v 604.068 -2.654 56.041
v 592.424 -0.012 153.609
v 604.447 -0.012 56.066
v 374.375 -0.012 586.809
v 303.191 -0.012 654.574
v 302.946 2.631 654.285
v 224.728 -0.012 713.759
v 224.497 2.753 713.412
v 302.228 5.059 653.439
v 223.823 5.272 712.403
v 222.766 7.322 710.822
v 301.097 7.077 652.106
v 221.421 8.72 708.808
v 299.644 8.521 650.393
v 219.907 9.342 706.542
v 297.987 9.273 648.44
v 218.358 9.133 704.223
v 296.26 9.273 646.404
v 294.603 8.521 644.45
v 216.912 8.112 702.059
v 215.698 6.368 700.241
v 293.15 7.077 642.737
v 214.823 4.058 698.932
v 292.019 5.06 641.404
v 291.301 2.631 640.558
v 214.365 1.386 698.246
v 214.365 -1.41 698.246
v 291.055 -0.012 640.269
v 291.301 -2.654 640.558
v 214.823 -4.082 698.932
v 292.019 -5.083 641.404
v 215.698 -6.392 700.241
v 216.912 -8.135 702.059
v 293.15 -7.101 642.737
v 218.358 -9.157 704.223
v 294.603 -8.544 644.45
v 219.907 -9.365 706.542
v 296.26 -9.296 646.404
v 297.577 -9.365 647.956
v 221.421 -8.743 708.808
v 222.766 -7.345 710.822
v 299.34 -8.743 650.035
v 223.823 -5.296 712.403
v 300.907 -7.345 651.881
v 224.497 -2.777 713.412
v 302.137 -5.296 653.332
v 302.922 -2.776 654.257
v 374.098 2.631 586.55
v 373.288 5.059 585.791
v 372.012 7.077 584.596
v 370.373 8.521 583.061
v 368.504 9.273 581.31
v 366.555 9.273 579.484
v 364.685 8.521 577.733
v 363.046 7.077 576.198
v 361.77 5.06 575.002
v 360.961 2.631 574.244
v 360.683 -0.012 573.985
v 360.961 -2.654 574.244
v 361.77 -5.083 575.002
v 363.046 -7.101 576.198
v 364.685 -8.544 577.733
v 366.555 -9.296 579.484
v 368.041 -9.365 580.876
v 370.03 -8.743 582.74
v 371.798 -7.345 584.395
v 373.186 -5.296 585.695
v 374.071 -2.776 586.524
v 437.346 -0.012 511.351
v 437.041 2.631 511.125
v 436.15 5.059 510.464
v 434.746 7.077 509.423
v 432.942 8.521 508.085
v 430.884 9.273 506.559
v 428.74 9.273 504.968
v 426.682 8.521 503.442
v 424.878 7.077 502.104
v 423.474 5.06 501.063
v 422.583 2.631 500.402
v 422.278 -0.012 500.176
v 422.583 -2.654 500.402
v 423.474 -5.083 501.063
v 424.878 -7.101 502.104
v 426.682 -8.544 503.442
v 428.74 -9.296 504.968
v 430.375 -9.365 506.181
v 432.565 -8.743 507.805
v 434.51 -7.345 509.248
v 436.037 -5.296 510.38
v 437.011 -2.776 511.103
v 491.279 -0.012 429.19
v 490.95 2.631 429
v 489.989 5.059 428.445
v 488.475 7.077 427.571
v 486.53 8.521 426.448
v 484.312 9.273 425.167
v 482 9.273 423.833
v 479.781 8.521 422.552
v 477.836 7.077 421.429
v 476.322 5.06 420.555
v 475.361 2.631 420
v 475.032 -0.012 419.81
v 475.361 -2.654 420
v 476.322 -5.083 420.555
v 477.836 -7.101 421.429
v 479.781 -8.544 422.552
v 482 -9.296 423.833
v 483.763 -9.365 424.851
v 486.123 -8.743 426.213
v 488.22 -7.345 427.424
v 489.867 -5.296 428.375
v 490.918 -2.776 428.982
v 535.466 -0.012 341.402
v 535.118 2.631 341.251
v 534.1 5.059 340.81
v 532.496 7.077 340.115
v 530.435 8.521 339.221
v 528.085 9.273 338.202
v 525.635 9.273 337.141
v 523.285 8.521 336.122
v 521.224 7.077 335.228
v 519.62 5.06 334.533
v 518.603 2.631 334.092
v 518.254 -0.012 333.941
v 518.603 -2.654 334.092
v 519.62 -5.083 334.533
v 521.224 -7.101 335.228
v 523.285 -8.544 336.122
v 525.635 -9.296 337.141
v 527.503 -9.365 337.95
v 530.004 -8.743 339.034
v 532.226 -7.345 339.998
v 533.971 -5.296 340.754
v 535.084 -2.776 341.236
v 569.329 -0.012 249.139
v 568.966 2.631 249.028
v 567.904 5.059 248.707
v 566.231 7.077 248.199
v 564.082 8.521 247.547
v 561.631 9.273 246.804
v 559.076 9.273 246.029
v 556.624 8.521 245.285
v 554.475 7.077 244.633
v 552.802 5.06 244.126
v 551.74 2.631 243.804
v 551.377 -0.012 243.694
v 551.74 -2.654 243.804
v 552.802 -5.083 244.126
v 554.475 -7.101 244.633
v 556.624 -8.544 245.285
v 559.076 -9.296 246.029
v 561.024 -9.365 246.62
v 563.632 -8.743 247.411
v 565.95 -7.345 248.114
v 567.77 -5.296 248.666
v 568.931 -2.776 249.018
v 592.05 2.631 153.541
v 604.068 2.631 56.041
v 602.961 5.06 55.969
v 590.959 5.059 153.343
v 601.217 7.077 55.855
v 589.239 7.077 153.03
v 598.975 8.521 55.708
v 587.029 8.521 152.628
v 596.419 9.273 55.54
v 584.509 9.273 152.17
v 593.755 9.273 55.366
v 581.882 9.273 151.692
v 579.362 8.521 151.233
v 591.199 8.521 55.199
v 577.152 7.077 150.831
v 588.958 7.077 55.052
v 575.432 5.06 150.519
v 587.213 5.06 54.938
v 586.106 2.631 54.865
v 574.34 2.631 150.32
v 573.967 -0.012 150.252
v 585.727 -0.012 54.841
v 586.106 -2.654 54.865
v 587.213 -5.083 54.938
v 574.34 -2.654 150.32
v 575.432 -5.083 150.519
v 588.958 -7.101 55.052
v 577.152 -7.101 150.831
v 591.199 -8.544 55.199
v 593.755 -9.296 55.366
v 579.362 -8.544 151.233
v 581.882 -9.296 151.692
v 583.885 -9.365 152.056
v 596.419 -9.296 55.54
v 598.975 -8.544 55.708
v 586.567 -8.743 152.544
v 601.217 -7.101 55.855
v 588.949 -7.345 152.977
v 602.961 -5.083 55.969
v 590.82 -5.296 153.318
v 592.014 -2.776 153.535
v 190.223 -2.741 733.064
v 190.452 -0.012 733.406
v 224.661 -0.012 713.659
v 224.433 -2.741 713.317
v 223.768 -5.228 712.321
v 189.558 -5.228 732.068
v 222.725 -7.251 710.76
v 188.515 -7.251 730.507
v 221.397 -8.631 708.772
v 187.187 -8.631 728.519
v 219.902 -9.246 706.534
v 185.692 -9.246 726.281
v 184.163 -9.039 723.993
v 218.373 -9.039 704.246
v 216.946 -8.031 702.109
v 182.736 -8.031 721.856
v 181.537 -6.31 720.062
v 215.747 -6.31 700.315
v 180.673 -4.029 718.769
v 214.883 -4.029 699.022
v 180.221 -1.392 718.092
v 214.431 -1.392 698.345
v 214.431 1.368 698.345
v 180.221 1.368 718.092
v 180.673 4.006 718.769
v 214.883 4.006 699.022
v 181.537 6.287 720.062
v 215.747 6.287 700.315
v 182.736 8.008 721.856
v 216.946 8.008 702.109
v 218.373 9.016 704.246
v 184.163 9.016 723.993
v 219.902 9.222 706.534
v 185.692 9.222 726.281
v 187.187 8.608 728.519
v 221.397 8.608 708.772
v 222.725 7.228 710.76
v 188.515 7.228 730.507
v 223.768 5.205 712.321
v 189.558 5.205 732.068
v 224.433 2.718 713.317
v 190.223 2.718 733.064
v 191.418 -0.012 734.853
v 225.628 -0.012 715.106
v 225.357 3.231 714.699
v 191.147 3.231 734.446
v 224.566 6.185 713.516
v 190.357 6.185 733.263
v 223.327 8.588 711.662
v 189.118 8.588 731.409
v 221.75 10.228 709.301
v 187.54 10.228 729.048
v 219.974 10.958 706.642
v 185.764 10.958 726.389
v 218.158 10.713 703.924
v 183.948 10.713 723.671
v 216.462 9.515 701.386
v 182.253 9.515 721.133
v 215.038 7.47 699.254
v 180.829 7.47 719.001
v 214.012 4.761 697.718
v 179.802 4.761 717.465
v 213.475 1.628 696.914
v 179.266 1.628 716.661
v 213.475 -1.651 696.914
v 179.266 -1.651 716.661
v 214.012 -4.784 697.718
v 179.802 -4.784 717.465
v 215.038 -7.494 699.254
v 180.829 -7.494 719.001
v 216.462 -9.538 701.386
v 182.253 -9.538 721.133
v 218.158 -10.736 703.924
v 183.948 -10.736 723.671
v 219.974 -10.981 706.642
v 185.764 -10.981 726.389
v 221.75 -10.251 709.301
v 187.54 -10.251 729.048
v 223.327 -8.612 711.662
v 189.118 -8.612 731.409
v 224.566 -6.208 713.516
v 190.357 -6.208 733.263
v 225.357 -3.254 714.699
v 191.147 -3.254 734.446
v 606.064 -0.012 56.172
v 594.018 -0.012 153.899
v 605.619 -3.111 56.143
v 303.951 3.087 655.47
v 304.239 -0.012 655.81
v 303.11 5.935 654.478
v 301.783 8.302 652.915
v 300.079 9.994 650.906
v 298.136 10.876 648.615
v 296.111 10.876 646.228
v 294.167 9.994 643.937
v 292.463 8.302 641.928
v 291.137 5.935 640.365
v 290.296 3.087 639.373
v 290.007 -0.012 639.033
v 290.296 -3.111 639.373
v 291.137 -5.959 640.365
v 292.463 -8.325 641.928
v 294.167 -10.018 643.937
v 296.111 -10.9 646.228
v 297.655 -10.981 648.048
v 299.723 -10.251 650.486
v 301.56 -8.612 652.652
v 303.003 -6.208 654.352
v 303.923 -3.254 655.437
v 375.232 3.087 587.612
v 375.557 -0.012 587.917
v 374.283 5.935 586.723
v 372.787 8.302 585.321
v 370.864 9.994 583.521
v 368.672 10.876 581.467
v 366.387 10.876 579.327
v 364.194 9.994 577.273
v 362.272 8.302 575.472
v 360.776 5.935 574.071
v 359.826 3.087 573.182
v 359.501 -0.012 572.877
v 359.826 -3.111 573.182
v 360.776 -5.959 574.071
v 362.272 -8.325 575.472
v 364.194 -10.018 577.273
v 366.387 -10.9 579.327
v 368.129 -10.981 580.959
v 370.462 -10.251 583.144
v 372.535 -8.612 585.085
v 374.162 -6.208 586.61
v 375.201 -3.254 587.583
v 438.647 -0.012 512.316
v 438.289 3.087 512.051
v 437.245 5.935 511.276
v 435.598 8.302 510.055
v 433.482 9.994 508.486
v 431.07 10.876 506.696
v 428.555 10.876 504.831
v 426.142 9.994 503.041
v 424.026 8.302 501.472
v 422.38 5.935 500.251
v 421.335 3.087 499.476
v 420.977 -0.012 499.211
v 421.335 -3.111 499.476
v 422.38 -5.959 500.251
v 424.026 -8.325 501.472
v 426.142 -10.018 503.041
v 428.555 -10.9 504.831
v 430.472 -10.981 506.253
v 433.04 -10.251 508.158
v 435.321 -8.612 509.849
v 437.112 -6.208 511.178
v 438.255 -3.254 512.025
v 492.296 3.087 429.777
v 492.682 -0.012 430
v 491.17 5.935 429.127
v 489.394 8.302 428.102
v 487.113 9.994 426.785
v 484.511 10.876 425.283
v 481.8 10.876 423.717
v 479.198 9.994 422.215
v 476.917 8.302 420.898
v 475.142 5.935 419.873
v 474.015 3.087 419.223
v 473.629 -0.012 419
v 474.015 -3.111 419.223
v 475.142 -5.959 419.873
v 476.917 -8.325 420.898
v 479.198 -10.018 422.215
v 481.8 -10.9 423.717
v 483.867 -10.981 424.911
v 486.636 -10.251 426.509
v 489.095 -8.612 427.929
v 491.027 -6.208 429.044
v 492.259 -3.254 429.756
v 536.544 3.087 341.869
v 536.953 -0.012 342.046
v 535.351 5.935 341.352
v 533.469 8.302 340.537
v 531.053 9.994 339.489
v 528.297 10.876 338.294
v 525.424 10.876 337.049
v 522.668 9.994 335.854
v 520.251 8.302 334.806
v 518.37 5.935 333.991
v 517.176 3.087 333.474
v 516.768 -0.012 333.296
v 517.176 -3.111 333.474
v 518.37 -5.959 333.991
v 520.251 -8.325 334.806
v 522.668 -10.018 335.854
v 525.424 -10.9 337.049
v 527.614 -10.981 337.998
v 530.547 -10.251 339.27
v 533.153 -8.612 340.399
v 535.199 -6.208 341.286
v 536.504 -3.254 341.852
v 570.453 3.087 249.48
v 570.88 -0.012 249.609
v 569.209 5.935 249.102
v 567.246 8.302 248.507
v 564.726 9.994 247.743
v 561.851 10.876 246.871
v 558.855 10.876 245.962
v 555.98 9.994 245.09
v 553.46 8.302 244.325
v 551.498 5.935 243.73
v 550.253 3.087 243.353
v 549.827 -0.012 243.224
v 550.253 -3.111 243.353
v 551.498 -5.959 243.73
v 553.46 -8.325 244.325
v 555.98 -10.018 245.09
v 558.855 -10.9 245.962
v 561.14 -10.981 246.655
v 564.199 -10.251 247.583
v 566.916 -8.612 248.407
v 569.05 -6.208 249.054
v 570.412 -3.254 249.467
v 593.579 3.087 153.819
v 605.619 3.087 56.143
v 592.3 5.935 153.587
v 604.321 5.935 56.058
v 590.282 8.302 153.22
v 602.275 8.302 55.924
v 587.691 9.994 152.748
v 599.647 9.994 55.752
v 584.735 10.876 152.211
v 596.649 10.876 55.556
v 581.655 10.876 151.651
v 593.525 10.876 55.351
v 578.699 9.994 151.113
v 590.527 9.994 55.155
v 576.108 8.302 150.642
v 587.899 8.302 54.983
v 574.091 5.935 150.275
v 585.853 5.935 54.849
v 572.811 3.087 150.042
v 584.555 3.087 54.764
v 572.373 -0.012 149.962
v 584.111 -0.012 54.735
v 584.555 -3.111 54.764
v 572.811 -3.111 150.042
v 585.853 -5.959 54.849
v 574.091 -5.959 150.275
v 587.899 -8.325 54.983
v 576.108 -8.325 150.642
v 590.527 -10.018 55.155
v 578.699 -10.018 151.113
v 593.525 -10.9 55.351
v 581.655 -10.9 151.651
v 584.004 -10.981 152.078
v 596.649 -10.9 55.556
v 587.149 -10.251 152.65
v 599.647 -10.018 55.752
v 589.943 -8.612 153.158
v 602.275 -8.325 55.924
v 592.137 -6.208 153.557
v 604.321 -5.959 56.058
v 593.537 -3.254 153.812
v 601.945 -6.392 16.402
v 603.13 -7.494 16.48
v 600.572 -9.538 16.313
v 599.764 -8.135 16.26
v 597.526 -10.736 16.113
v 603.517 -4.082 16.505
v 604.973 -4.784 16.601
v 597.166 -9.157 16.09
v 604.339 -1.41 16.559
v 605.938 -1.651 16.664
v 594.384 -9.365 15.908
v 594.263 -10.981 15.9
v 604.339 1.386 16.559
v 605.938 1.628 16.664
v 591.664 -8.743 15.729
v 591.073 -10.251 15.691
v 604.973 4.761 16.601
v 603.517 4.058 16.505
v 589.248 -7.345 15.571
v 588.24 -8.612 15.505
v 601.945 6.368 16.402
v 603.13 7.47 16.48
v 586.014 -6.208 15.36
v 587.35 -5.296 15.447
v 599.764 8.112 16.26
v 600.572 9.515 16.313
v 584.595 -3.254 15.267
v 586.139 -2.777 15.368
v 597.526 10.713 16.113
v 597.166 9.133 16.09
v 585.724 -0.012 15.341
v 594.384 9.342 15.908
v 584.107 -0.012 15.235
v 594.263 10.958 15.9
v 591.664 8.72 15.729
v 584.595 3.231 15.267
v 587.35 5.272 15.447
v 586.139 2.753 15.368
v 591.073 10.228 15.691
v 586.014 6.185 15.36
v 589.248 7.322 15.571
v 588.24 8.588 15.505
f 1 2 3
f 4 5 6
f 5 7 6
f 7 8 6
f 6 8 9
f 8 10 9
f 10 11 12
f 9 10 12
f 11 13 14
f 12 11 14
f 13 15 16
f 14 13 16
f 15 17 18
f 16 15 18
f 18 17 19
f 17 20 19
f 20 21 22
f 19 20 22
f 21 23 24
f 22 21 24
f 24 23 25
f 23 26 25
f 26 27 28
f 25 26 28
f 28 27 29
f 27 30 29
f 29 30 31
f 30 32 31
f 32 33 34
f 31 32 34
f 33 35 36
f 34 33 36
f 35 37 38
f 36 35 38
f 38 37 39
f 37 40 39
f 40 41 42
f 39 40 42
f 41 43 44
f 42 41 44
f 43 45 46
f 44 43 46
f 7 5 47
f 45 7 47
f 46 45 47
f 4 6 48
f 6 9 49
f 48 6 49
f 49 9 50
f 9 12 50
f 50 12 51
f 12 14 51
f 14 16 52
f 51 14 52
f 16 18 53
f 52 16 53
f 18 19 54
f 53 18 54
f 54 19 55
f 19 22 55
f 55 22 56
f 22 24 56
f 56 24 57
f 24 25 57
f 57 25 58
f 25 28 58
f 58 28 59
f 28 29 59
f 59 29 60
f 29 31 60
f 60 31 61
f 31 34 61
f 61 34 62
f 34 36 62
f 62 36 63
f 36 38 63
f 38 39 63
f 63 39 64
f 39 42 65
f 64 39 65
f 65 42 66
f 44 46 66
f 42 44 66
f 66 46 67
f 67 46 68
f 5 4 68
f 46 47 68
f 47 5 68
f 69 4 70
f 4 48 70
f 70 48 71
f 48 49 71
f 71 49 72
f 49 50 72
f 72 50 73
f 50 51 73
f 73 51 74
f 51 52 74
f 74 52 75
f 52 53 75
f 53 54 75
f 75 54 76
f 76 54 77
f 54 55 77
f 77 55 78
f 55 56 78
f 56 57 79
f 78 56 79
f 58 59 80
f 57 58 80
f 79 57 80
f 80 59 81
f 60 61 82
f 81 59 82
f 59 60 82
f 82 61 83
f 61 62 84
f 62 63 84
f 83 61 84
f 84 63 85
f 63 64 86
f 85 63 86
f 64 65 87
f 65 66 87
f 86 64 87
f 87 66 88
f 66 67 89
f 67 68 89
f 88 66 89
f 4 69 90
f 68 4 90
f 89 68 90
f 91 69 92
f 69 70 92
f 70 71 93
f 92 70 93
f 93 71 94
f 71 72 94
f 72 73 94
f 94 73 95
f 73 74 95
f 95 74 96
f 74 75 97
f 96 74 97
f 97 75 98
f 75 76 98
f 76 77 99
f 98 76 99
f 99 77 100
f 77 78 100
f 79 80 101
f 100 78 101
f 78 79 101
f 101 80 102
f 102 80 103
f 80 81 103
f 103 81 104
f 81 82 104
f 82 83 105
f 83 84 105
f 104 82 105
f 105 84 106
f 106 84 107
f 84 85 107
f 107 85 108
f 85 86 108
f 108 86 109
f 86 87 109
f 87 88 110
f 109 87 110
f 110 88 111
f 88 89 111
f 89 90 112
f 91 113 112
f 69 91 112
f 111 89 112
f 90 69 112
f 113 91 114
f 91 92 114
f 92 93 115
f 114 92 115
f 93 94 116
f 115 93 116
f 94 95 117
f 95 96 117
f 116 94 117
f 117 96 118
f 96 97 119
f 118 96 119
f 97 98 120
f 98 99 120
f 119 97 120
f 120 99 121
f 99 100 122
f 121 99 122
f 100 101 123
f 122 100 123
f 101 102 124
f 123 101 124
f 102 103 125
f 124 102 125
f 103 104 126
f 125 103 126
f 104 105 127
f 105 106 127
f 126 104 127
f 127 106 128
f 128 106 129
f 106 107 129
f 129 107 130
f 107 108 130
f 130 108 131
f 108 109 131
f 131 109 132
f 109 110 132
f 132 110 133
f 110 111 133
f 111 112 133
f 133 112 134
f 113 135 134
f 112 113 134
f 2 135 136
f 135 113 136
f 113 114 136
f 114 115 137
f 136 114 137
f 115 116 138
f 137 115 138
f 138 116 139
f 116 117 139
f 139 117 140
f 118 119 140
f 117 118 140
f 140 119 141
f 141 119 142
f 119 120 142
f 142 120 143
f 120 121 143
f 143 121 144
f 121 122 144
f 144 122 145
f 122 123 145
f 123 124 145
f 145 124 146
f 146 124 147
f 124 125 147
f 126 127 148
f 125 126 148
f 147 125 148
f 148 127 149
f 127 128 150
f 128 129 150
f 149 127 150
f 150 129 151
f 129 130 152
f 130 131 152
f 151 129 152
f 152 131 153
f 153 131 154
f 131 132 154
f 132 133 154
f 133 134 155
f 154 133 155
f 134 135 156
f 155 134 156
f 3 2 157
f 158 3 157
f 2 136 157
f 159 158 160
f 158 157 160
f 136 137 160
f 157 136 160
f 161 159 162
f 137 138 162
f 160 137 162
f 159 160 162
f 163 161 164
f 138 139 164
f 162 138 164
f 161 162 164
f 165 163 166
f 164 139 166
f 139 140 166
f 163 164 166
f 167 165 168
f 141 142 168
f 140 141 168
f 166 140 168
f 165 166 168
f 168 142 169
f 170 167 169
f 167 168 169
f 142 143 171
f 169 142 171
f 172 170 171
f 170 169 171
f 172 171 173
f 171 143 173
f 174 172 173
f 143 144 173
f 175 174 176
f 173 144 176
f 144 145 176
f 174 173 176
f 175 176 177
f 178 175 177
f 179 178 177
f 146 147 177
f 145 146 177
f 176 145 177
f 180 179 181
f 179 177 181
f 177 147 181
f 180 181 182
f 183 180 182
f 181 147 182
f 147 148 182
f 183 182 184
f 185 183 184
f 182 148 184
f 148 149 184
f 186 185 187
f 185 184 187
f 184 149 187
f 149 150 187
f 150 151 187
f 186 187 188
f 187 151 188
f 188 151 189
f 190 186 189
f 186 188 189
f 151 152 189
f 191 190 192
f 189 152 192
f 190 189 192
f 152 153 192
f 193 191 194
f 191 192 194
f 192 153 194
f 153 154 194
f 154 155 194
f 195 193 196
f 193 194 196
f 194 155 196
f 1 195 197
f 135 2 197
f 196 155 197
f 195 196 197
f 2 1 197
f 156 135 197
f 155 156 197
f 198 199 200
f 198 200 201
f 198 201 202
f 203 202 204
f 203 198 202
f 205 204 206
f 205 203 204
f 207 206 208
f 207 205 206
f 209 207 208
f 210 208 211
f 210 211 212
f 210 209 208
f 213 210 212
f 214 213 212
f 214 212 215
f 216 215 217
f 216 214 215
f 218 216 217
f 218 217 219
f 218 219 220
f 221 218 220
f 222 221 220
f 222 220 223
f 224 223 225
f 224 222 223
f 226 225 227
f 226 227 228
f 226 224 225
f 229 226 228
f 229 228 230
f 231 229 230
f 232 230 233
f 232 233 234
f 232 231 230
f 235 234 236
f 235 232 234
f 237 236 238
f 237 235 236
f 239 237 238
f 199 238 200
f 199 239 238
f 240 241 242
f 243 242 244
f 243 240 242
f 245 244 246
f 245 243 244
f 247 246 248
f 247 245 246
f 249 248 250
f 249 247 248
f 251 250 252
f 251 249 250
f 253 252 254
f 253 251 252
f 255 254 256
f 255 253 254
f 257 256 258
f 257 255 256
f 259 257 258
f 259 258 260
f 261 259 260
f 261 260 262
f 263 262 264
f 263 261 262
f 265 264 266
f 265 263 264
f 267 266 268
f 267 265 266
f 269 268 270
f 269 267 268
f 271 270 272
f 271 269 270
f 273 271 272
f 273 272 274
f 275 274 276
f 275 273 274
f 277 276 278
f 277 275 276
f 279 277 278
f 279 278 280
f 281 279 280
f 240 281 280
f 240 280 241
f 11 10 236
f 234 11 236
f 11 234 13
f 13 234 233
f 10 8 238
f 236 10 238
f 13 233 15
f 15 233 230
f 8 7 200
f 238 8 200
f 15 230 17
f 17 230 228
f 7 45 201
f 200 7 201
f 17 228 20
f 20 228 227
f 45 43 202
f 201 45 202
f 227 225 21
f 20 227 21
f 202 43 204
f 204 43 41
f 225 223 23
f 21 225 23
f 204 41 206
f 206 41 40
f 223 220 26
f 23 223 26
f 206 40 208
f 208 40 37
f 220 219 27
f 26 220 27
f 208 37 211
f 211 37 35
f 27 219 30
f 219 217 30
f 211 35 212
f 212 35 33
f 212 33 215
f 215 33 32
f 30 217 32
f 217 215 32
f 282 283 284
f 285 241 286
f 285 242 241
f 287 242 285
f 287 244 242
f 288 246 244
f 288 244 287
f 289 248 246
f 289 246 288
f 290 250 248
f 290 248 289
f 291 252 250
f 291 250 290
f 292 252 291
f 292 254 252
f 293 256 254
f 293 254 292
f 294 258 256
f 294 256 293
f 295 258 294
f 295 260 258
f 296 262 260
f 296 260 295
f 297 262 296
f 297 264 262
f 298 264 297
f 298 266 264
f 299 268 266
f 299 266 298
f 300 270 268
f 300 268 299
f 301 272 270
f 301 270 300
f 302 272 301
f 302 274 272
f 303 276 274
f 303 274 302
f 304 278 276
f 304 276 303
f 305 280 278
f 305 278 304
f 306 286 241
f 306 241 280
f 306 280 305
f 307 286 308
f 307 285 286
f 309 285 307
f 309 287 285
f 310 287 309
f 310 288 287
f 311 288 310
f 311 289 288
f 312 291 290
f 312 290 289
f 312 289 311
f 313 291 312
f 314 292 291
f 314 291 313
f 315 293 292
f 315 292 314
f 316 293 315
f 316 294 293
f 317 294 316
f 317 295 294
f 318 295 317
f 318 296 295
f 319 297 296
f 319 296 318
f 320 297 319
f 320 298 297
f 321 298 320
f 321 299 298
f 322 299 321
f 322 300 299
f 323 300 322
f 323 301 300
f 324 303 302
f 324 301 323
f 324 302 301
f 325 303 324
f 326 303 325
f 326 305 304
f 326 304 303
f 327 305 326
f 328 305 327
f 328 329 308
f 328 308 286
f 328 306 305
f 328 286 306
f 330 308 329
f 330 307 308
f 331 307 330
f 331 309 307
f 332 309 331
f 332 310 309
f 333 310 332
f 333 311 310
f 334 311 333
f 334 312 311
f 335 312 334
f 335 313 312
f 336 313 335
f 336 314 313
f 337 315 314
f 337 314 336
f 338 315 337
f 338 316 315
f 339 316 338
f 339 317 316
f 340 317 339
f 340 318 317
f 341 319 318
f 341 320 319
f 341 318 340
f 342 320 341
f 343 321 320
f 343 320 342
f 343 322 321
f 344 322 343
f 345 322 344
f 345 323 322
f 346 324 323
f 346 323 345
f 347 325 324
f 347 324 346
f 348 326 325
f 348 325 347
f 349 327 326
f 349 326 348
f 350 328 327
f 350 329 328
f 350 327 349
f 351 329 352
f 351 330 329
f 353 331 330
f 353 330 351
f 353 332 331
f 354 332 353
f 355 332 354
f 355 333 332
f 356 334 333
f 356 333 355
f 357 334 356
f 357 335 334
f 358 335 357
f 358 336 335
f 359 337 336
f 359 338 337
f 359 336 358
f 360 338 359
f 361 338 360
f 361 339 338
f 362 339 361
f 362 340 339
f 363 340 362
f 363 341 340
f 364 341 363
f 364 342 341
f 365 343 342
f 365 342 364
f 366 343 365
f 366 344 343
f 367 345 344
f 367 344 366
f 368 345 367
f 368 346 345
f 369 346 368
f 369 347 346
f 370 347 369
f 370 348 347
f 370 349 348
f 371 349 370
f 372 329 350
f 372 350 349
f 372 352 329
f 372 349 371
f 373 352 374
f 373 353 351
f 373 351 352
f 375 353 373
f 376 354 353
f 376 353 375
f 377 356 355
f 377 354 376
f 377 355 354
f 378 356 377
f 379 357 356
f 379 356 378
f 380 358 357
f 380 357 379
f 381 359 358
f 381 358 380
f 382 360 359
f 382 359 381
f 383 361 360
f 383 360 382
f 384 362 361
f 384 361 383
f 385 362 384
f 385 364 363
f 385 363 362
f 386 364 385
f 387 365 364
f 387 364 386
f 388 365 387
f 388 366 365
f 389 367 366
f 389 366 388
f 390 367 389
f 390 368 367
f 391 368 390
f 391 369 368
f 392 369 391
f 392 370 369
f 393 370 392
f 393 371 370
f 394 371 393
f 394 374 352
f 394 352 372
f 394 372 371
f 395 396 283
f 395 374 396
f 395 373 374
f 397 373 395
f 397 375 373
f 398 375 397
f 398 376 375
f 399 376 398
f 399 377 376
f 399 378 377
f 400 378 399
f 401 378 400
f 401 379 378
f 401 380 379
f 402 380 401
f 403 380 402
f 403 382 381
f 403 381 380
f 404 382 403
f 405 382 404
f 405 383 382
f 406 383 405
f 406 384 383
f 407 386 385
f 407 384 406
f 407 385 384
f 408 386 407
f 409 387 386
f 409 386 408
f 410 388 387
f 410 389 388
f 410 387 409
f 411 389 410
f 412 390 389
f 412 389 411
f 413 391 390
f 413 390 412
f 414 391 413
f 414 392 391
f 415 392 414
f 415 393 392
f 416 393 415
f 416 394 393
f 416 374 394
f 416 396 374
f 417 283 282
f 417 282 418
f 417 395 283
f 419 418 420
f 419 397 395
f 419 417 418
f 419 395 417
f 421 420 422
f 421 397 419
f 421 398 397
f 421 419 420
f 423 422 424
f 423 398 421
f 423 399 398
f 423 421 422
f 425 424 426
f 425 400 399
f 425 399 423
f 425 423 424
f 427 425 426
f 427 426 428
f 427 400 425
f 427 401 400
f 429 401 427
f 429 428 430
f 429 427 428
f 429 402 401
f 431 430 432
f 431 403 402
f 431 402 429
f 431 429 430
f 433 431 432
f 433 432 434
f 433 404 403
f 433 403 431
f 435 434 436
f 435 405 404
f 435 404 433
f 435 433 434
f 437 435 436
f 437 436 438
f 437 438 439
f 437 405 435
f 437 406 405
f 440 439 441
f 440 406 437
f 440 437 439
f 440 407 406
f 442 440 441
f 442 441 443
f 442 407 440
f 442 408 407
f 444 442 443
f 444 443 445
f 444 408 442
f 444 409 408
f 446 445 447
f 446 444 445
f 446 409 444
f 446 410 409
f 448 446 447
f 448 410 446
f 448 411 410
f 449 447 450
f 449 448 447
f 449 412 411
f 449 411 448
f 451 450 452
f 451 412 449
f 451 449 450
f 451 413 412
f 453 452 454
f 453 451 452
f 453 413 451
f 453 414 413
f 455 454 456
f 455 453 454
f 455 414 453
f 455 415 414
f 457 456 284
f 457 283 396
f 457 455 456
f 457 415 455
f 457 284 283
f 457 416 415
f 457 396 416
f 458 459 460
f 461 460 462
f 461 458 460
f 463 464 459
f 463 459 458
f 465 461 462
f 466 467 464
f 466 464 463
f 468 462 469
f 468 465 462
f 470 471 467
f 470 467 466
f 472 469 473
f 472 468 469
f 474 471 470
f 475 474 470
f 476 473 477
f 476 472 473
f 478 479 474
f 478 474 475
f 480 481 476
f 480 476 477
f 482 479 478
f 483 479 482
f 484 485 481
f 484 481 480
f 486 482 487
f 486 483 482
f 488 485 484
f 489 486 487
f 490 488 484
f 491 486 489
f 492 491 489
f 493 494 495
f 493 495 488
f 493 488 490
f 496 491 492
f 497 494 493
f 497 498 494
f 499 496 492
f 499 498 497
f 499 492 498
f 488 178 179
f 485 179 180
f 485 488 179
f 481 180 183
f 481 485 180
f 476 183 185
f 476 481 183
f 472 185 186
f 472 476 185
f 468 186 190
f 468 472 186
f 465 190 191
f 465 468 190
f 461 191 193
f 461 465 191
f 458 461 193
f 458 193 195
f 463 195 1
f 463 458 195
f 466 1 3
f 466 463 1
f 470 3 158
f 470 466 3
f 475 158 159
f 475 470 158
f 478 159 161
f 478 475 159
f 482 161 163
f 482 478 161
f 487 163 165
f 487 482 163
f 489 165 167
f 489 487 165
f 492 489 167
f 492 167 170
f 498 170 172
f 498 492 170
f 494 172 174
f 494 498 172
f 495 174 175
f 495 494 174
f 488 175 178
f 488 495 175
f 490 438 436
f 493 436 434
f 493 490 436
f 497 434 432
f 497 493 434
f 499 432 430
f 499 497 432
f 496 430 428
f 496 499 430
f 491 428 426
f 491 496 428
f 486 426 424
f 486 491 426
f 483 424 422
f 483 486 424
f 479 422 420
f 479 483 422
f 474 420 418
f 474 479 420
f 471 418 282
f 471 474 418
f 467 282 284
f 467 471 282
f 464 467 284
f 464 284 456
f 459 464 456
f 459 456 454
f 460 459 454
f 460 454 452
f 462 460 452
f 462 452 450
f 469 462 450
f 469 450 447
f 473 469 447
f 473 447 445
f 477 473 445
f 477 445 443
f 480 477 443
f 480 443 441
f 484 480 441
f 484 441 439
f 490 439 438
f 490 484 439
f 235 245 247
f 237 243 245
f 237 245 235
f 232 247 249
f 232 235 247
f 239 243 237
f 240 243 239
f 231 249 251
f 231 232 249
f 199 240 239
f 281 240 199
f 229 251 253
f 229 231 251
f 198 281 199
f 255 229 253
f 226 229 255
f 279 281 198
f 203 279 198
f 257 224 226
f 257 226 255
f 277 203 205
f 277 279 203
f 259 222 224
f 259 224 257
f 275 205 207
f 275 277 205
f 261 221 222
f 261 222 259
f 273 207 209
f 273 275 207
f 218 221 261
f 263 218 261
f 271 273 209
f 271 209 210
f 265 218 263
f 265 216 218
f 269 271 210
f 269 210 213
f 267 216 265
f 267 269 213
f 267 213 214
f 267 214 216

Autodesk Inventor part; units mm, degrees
ref_plane "YZ Plane" through (0, 0, 0) normal (1, 0, 0) x (0, 1, 0)
ref_plane "XZ Plane" through (0, 0, 0) normal (0, 1, 0) x (-1, 0, 0)
ref_plane "XY Plane" through (0, 0, 0) normal (0, 0, 1) x (1, 0, 0)
sketch "Sketch1" plane through (0, 0, 0) normal (0, 0, 1) x (1, 0, 0)
  circle A0 centre (596.9, -0.0117) radius 11
  line L0 (-252.1, 80.9625) -> (-252.1, -95.25)
  circle A1 centre (596.9, -0.0117) radius 9.38
  dimension "d6" = 22
  dimension "d7" = 849
  dimension "d9" = 1.62
revolve "Revolution1" add sketch "Sketch1" angle 60 about axis through (-252.1, 80.9625, 0) along (0, -1, 0)
sketch "Sketch4" plane through (0, 0, 0) normal (0, 1, 0) x (-1, 0, 0)
  line L0 (-607.9, 0) -> (-585.9, 0) projected
  line L1 (-607.9, 0) -> (252.1, 0) construction
  line L2 (252.1, 0) -> (-595.0871, 55.4533) construction
  line L3 (-177.9, 744.7818) -> (-166.9, 725.7293) projected
  line L4 (252.1, 0) -> (-177.9, 744.7818) construction
  line L5 (252.1, 0) -> (-225.628, 715.1056) construction
  arc A0 (-177.9, 744.7818) -> (-607.9, 0) centre (252.1, 0) ccw projected
  arc A1 (-595.0871, 55.4533) -> (-596.9, 0) centre (252.1, 0) ccw
  arc A2 (-172.4, 735.2556) -> (-219.5175, 705.9589) centre (252.1, 0) ccw
  point P0 (0, 0)
  dimension "d10" = 860
  dimension "d12" = 3.745
  dimension "d13" = 3.745
sketch "Sketch5" plane through (596.9, -0.0117, 0) normal (0, 0, -1) x (-1, 0, 0)
  circle A0 centre (0, 0) radius 9.38
  circle A1 centre (0, 0) radius 11
  point P0 (596.9, 0.0117)
sweep "Sweep1" cut profiles "Sketch5" path "Sketch4" path curves A1
sketch "Sketch6" plane through (172.4, -0.0117, 735.2556) normal (-0.8660254, 0, 0.5) x (0.5, 0, 0.8660254)
  circle A0 centre (0, 0) radius 9.38
  circle A1 centre (0, 0) radius 11
  point P0 (-722.95, 0.0117)
sweep "Sweep2" cut profiles "Sketch6" path "Sketch4" path curves A2
sketch "Sketch11" plane through (0, 0, 0) normal (0, 1, 0) x (-1, 0, 0)
  line L0 (-225.628, 715.1056) -> (-213.407, 696.8122) projected
  line L1 (-219.5175, 705.9589) -> (-185.3078, 725.7059)
  line L2 (-584.1106, 54.7348) -> (-606.0636, 56.1718) projected
  line L3 (-595.0871, 55.4533) -> (-595.0836, 15.9533)
  point P0 (0, 0)
  dimension "d26" = 39.5
  dimension "d32" = 93.75
  dimension "d33" = 39.5
  dimension "d34" = 93.75
sketch "Sketch12" plane through (219.5175, -0.0117, 705.9589) normal (-0.8315181, 0, 0.5554977) x (0.5554977, 0, 0.8315181)
  circle A0 centre (0, 0) radius 9.2599
  circle A1 centre (0, 0) radius 11
  point P0 (-708.959, 0.0117)
sweep "Sweep4" add profiles "Sketch12" path "Sketch11" path curves L1
sketch "Sketch13" plane through (595.0871, -0.0117, 55.4533) normal (0.065316, 0, -0.9978646) x (-0.9978646, 0, -0.065316)
  circle A0 centre (0, 0) radius 9.38
  circle A1 centre (0, 0) radius 11
  point P0 (597.4383, 0.0117)
sweep "Sweep5" add profiles "Sketch13" path "Sketch11" path curves L3
properties part number "2f2arc"
